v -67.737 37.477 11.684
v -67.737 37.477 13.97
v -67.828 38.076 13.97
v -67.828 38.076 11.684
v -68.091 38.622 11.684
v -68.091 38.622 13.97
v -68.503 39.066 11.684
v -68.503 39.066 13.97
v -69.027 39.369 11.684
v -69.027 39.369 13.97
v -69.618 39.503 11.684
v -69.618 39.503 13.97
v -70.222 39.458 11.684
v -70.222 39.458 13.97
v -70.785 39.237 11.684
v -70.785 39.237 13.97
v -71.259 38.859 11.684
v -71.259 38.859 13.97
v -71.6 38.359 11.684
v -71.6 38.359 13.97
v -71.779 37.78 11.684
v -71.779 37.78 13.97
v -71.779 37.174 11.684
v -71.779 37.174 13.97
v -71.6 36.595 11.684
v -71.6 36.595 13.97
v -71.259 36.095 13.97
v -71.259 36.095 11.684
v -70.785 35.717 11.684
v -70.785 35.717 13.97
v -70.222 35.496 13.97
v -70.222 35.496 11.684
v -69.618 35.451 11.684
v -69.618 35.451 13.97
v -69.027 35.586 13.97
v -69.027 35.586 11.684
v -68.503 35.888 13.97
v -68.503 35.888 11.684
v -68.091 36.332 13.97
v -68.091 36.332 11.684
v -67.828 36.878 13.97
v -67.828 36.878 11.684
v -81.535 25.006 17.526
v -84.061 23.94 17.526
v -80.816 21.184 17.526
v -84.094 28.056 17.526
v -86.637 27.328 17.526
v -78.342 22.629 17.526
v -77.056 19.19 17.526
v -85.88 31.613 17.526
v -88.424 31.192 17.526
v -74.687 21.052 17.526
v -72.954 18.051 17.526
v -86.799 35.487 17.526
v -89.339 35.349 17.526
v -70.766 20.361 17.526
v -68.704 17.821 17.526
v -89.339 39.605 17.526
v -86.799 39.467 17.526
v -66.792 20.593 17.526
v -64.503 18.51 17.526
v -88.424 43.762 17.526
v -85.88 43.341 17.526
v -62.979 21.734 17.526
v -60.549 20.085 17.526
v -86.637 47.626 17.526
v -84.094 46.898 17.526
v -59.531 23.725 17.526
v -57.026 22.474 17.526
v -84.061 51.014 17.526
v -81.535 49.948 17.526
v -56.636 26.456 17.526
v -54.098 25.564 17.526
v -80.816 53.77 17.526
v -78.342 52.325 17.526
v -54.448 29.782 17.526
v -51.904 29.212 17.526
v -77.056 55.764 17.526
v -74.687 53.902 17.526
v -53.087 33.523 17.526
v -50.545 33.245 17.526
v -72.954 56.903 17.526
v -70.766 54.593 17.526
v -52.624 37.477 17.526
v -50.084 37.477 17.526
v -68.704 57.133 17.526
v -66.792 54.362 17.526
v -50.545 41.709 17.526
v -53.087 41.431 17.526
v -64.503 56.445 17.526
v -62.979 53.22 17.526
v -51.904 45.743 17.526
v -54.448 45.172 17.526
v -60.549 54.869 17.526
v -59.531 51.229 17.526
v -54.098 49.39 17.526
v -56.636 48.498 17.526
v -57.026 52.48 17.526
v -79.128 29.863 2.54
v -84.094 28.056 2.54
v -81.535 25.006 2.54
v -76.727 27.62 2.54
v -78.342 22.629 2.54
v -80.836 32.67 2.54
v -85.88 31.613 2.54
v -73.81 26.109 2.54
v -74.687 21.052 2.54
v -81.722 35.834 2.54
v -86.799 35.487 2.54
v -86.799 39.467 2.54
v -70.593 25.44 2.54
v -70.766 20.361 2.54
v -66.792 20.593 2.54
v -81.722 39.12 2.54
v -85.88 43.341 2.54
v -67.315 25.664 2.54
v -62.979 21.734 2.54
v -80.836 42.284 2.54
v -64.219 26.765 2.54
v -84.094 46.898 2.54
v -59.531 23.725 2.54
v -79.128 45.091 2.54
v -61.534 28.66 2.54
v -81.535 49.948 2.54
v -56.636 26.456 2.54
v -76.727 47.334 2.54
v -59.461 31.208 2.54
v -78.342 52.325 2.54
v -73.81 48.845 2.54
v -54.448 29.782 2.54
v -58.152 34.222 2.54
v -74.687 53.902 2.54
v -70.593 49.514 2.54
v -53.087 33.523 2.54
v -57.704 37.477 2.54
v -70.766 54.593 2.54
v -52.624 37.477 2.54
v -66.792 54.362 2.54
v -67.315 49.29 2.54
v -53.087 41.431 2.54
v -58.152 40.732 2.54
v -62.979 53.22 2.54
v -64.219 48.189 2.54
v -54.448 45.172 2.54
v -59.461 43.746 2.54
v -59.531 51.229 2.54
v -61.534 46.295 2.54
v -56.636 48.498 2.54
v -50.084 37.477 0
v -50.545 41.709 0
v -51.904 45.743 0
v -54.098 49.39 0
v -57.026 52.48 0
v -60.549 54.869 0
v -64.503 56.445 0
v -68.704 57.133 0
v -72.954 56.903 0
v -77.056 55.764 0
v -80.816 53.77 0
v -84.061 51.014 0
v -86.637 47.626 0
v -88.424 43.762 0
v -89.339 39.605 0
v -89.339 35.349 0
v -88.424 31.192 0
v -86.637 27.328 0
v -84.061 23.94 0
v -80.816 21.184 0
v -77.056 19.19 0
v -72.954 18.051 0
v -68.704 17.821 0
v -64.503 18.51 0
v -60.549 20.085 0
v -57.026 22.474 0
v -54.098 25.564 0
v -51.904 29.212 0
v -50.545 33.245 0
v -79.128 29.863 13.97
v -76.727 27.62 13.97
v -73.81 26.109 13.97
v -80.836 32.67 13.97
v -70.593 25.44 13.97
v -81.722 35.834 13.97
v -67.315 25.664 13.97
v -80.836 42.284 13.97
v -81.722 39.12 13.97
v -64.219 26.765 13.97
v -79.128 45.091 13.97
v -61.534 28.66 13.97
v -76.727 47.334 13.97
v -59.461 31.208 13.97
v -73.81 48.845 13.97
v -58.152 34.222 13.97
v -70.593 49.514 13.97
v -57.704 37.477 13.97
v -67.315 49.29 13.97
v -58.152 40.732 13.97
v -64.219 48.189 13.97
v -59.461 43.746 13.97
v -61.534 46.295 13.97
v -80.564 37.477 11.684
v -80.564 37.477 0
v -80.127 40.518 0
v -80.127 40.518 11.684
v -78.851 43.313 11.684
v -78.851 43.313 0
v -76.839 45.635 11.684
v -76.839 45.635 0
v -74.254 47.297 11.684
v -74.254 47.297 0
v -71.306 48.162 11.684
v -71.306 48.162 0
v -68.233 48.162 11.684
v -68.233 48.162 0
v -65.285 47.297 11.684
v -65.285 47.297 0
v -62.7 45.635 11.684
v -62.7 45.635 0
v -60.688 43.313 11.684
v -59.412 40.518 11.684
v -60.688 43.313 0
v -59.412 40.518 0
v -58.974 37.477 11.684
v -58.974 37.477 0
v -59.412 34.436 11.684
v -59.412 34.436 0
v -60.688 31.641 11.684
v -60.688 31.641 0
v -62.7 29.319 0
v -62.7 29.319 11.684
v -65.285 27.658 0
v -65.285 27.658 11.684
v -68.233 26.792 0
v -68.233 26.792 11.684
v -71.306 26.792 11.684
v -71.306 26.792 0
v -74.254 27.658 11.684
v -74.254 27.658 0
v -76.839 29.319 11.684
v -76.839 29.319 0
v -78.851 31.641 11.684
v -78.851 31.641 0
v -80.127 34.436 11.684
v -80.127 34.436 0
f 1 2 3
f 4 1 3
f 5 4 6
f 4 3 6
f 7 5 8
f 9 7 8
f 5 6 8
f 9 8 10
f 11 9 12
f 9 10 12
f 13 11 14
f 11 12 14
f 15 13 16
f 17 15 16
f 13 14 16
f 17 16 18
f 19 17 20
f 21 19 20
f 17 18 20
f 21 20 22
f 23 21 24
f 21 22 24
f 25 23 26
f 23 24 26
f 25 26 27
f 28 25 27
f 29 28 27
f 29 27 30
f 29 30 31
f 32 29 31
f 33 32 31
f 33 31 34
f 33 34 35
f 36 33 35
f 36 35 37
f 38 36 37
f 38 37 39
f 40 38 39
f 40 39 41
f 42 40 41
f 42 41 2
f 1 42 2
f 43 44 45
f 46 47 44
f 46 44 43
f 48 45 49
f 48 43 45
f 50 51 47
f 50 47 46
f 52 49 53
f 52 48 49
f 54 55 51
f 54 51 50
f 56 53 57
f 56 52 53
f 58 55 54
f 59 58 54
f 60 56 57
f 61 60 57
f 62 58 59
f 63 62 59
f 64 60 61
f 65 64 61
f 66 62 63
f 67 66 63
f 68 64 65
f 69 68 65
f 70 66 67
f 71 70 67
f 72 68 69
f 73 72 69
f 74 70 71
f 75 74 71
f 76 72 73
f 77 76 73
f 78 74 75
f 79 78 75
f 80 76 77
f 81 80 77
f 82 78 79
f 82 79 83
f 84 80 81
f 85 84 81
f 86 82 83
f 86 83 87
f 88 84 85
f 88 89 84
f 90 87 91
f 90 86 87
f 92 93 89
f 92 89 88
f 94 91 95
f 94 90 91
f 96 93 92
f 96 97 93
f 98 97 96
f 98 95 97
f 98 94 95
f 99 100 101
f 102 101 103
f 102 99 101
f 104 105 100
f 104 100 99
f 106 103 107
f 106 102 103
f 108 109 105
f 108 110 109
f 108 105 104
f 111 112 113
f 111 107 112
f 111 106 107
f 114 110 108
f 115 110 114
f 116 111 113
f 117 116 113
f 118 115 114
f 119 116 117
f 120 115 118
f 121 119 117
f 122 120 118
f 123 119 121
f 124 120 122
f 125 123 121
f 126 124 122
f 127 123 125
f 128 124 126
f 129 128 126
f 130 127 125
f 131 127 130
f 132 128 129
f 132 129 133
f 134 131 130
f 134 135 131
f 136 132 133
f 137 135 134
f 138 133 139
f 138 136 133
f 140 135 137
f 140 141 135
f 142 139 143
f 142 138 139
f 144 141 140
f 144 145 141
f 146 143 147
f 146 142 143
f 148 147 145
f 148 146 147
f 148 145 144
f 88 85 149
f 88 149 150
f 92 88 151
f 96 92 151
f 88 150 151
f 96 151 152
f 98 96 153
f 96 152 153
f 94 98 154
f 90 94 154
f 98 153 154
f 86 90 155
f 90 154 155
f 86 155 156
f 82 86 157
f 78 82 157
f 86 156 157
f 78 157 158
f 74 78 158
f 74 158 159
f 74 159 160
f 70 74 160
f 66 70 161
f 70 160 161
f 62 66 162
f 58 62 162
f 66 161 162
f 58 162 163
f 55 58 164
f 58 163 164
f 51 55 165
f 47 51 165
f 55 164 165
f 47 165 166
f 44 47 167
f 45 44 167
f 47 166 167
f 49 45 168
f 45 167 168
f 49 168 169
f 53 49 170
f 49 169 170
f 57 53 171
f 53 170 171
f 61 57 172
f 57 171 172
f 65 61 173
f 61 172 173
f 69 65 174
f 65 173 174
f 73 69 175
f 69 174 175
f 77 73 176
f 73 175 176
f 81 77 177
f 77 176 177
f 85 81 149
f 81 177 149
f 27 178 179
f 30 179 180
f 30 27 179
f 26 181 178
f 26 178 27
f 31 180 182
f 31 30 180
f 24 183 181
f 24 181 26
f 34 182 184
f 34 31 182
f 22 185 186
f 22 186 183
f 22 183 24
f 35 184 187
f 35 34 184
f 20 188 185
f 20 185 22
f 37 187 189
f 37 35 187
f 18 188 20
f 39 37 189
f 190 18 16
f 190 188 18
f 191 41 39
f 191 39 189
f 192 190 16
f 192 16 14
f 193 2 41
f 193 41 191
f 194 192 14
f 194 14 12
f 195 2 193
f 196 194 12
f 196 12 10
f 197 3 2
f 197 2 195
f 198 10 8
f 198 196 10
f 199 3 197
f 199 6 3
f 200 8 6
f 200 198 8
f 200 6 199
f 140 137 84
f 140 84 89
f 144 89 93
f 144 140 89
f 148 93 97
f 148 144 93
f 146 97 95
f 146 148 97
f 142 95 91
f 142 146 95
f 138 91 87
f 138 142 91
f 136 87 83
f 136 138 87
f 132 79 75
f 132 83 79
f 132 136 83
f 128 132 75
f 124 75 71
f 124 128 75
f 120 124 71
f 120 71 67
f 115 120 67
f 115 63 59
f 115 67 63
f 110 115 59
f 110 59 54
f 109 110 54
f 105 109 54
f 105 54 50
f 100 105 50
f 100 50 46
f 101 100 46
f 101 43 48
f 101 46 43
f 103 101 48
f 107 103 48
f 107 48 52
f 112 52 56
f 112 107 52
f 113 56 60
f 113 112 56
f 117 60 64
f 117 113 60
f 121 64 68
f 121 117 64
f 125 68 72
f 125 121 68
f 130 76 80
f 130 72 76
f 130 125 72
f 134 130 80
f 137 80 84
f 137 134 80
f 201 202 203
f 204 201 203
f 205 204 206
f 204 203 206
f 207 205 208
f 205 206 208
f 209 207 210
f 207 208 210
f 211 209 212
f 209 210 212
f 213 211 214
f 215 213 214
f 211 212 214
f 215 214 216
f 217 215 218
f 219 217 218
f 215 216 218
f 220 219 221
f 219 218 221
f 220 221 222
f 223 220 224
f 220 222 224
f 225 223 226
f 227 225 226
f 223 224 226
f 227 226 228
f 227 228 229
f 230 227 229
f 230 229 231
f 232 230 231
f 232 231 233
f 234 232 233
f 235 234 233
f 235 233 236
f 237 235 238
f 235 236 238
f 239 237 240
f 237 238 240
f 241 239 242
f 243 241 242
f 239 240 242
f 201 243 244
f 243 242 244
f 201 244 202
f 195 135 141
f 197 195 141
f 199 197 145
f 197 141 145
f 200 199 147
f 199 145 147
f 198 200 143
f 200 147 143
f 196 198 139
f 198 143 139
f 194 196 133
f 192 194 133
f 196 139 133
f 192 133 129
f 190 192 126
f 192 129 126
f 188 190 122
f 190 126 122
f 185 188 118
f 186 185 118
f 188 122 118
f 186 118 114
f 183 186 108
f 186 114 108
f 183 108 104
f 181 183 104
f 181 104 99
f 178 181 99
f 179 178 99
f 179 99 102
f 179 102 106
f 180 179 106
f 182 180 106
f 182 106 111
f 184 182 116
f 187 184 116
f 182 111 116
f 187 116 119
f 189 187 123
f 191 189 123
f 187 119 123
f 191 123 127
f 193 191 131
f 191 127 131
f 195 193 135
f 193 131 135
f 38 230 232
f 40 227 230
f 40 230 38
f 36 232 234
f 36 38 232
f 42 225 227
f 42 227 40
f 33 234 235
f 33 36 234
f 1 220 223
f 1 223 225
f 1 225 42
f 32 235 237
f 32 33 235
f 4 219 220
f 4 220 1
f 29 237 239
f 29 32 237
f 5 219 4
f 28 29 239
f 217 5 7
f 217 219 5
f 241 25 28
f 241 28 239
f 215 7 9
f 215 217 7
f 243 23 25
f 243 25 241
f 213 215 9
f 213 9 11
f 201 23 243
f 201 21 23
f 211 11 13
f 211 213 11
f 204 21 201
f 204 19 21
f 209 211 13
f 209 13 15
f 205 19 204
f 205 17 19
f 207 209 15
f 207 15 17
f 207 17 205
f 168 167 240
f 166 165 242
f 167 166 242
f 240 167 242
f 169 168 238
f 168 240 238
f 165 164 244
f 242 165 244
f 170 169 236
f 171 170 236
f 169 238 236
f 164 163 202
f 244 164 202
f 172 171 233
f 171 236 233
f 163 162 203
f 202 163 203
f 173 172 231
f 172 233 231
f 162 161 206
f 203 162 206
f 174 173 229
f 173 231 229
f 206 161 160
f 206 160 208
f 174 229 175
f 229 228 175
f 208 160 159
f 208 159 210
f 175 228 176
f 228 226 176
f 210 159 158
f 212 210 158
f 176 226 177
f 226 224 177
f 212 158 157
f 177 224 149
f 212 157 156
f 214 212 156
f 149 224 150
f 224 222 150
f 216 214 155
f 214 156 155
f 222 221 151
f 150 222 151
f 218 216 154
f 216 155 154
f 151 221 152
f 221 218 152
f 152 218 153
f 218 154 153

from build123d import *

# Parameters (mm, degrees)
SKETCH1_R           = 19.685
BOSS_EXTRUDE4_DEPTH = 17.526
SHELL1_T            = -2.54
SKETCH2_R           = 12.065
BOSS_EXTRUDE5_DEPTH = 11.43
SKETCH3_R           = 10.795
CUT_EXTRUDE1_DEPTH  = 11.684
SKETCH4_R           = 2.032
CUT_EXTRUDE2_DEPTH  = 2.54


with BuildPart() as part:
    # Sketch1 → Boss-Extrude4 (new body)
    with BuildSketch(Plane.XY):
        with Locations((-69.769461907, 37.477045181)):
            Circle(SKETCH1_R)
    extrude(amount=BOSS_EXTRUDE4_DEPTH)

    # Shell1
    shell1_openings = [part.faces().sort_by_distance(p)[0] for p in [
        (-69.769461907, 37.477045181, 17.526),
    ]]
    offset(amount=SHELL1_T, openings=shell1_openings, kind=Kind.INTERSECTION)

    # Sketch2 → Boss-Extrude5 (add)
    with BuildSketch(Plane.XY.offset(2.54)):
        with Locations((-69.769461907, 37.477045181)):
            Circle(SKETCH2_R)
    extrude(amount=BOSS_EXTRUDE5_DEPTH)

    # Sketch3 → Cut-Extrude1 (cut)
    with BuildSketch(Plane(origin=(0, 0, 0), x_dir=(-1, 0, 0), z_dir=(0, 0, -1))):
        with Locations((69.769461907, 37.477045181)):
            Circle(SKETCH3_R)
    extrude(amount=-CUT_EXTRUDE1_DEPTH, mode=Mode.SUBTRACT)

    # Sketch4 → Cut-Extrude2 (cut)
    with BuildSketch(Plane.XY.offset(13.97)):
        with Locations((-69.769461907, 37.477045181)):
            Circle(SKETCH4_R)
    extrude(amount=-CUT_EXTRUDE2_DEPTH, mode=Mode.SUBTRACT)


solid = part.part
